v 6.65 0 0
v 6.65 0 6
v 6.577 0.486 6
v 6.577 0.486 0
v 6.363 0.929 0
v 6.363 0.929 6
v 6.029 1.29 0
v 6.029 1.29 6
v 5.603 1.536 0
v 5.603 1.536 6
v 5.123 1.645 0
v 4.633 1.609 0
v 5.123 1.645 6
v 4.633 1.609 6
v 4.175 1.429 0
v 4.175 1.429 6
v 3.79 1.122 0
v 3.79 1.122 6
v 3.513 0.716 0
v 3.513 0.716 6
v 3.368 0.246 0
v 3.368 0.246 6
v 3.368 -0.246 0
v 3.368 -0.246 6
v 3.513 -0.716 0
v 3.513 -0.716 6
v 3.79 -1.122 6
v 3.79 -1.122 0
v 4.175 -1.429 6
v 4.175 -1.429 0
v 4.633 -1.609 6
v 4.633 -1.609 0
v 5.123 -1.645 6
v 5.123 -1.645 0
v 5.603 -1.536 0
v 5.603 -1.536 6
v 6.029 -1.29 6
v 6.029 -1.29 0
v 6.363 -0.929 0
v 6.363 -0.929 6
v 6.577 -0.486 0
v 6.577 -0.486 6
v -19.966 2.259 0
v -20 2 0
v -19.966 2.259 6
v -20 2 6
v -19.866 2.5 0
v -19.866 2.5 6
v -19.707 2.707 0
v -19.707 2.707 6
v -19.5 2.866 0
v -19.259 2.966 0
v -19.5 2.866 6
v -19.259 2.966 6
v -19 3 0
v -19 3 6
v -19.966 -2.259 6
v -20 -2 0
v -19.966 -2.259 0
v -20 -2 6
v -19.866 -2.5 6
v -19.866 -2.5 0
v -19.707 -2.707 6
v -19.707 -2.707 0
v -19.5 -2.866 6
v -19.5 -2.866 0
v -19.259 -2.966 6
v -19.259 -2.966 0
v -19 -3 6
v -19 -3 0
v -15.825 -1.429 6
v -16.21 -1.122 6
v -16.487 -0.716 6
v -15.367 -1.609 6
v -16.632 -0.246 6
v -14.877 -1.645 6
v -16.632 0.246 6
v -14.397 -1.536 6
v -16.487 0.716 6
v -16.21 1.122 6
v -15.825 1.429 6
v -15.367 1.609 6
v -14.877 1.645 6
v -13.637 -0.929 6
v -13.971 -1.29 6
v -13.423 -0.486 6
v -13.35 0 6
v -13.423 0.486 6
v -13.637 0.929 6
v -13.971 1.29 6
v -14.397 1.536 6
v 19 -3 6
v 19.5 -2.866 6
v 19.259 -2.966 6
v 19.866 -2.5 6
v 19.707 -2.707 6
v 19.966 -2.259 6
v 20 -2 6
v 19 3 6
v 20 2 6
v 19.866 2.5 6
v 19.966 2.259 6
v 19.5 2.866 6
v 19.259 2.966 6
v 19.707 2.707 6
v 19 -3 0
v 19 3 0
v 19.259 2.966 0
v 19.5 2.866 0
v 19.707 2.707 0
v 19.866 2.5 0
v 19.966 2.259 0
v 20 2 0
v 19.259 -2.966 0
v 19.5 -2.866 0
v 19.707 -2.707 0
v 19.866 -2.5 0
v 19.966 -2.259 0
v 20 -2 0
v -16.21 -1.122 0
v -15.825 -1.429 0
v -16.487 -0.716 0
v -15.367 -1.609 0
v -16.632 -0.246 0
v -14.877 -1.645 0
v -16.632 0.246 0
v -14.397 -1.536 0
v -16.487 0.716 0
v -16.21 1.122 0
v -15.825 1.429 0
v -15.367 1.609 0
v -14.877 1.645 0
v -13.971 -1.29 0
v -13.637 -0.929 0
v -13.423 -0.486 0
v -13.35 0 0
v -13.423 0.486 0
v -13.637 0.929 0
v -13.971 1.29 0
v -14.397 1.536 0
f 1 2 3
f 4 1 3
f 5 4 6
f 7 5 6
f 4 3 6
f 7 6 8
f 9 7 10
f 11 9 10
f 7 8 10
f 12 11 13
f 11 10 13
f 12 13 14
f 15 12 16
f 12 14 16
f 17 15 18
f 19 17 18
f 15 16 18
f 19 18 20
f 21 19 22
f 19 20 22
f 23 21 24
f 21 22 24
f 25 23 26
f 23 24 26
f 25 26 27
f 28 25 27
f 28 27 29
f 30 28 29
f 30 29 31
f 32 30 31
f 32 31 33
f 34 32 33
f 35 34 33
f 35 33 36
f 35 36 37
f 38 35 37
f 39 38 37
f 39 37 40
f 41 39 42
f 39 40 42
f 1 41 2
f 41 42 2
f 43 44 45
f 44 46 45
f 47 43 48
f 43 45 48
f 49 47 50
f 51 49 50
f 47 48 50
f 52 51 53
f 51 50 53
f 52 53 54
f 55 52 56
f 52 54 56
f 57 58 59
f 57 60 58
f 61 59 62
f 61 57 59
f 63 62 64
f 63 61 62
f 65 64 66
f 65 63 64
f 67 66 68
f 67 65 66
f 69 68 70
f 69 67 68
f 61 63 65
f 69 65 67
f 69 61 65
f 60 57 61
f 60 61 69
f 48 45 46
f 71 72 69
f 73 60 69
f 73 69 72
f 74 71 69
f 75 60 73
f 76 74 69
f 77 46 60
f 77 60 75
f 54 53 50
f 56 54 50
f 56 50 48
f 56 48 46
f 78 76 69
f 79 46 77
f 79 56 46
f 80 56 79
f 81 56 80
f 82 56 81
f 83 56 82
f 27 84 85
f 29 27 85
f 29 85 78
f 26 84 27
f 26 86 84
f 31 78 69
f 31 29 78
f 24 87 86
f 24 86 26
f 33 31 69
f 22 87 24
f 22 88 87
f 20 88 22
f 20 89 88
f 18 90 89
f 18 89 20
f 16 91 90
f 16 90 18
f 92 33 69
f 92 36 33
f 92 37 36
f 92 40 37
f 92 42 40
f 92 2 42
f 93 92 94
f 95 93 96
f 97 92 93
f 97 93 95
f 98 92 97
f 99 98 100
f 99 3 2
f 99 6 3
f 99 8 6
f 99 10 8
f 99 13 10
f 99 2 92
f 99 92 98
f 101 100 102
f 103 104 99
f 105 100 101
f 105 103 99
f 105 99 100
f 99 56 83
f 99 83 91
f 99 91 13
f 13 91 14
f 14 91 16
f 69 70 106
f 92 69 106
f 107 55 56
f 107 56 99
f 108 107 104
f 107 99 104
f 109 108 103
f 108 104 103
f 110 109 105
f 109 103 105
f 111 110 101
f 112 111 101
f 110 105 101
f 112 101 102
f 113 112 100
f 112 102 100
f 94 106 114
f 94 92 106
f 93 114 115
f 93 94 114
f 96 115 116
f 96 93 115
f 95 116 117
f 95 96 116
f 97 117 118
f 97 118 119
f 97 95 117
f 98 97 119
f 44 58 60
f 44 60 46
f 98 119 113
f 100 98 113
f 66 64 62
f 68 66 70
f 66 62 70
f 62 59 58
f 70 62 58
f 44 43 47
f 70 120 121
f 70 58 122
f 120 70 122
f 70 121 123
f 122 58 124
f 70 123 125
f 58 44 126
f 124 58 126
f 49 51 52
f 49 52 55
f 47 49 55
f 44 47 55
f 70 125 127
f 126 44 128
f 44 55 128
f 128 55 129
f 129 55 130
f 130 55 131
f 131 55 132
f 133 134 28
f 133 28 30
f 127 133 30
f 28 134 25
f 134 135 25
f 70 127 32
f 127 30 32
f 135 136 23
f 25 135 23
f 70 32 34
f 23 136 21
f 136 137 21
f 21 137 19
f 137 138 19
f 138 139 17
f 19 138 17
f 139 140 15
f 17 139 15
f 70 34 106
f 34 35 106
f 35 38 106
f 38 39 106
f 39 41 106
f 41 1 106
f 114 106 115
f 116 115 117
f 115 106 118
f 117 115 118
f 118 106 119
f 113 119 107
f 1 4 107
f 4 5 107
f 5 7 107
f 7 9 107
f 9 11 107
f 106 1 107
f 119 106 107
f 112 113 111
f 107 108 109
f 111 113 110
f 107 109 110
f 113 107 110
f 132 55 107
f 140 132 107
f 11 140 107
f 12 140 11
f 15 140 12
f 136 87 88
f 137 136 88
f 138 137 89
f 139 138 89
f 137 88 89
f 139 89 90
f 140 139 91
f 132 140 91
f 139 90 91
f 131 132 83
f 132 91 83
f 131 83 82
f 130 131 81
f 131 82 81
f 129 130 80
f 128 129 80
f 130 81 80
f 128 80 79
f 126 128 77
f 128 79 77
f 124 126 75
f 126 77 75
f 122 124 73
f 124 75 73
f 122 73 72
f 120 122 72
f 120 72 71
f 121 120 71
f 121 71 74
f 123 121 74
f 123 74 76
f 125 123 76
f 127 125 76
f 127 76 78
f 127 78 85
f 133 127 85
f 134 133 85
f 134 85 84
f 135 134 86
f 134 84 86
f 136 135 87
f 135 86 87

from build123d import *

# Parameters (mm, degrees)
SKETCH_1_W          = 40
SKETCH_1_H          = 6
EXTRUDE_1_DEPTH     = 6
SKETCH_2_R          = 1.65
CUT_EXTRUDE_1_DEPTH = 6
FILLET_1_R          = 1


with BuildPart() as part:
    # 草图1 → 凸台-拉伸1 (new body)
    with BuildSketch(Plane.XY):
        Rectangle(SKETCH_1_W, SKETCH_1_H)
    extrude(amount=EXTRUDE_1_DEPTH)

    # 草图2 → 切除-拉伸1 (cut)
    with BuildSketch(Plane.XY.offset(6)):
        with Locations((5, 0)):
            Circle(SKETCH_2_R)
        with Locations((-15, 0)):
            Circle(SKETCH_2_R)
    extrude(amount=-CUT_EXTRUDE_1_DEPTH, mode=Mode.SUBTRACT)

    # 圆角1
    fillet_1_edges = [part.edges().sort_by_distance(p)[0] for p in [
        (20, -3, 3),
        (-20, -3, 3),
        (-20, 3, 3),
        (20, 3, 3),
    ]]
    fillet(fillet_1_edges, radius=FILLET_1_R)


solid = part.part
